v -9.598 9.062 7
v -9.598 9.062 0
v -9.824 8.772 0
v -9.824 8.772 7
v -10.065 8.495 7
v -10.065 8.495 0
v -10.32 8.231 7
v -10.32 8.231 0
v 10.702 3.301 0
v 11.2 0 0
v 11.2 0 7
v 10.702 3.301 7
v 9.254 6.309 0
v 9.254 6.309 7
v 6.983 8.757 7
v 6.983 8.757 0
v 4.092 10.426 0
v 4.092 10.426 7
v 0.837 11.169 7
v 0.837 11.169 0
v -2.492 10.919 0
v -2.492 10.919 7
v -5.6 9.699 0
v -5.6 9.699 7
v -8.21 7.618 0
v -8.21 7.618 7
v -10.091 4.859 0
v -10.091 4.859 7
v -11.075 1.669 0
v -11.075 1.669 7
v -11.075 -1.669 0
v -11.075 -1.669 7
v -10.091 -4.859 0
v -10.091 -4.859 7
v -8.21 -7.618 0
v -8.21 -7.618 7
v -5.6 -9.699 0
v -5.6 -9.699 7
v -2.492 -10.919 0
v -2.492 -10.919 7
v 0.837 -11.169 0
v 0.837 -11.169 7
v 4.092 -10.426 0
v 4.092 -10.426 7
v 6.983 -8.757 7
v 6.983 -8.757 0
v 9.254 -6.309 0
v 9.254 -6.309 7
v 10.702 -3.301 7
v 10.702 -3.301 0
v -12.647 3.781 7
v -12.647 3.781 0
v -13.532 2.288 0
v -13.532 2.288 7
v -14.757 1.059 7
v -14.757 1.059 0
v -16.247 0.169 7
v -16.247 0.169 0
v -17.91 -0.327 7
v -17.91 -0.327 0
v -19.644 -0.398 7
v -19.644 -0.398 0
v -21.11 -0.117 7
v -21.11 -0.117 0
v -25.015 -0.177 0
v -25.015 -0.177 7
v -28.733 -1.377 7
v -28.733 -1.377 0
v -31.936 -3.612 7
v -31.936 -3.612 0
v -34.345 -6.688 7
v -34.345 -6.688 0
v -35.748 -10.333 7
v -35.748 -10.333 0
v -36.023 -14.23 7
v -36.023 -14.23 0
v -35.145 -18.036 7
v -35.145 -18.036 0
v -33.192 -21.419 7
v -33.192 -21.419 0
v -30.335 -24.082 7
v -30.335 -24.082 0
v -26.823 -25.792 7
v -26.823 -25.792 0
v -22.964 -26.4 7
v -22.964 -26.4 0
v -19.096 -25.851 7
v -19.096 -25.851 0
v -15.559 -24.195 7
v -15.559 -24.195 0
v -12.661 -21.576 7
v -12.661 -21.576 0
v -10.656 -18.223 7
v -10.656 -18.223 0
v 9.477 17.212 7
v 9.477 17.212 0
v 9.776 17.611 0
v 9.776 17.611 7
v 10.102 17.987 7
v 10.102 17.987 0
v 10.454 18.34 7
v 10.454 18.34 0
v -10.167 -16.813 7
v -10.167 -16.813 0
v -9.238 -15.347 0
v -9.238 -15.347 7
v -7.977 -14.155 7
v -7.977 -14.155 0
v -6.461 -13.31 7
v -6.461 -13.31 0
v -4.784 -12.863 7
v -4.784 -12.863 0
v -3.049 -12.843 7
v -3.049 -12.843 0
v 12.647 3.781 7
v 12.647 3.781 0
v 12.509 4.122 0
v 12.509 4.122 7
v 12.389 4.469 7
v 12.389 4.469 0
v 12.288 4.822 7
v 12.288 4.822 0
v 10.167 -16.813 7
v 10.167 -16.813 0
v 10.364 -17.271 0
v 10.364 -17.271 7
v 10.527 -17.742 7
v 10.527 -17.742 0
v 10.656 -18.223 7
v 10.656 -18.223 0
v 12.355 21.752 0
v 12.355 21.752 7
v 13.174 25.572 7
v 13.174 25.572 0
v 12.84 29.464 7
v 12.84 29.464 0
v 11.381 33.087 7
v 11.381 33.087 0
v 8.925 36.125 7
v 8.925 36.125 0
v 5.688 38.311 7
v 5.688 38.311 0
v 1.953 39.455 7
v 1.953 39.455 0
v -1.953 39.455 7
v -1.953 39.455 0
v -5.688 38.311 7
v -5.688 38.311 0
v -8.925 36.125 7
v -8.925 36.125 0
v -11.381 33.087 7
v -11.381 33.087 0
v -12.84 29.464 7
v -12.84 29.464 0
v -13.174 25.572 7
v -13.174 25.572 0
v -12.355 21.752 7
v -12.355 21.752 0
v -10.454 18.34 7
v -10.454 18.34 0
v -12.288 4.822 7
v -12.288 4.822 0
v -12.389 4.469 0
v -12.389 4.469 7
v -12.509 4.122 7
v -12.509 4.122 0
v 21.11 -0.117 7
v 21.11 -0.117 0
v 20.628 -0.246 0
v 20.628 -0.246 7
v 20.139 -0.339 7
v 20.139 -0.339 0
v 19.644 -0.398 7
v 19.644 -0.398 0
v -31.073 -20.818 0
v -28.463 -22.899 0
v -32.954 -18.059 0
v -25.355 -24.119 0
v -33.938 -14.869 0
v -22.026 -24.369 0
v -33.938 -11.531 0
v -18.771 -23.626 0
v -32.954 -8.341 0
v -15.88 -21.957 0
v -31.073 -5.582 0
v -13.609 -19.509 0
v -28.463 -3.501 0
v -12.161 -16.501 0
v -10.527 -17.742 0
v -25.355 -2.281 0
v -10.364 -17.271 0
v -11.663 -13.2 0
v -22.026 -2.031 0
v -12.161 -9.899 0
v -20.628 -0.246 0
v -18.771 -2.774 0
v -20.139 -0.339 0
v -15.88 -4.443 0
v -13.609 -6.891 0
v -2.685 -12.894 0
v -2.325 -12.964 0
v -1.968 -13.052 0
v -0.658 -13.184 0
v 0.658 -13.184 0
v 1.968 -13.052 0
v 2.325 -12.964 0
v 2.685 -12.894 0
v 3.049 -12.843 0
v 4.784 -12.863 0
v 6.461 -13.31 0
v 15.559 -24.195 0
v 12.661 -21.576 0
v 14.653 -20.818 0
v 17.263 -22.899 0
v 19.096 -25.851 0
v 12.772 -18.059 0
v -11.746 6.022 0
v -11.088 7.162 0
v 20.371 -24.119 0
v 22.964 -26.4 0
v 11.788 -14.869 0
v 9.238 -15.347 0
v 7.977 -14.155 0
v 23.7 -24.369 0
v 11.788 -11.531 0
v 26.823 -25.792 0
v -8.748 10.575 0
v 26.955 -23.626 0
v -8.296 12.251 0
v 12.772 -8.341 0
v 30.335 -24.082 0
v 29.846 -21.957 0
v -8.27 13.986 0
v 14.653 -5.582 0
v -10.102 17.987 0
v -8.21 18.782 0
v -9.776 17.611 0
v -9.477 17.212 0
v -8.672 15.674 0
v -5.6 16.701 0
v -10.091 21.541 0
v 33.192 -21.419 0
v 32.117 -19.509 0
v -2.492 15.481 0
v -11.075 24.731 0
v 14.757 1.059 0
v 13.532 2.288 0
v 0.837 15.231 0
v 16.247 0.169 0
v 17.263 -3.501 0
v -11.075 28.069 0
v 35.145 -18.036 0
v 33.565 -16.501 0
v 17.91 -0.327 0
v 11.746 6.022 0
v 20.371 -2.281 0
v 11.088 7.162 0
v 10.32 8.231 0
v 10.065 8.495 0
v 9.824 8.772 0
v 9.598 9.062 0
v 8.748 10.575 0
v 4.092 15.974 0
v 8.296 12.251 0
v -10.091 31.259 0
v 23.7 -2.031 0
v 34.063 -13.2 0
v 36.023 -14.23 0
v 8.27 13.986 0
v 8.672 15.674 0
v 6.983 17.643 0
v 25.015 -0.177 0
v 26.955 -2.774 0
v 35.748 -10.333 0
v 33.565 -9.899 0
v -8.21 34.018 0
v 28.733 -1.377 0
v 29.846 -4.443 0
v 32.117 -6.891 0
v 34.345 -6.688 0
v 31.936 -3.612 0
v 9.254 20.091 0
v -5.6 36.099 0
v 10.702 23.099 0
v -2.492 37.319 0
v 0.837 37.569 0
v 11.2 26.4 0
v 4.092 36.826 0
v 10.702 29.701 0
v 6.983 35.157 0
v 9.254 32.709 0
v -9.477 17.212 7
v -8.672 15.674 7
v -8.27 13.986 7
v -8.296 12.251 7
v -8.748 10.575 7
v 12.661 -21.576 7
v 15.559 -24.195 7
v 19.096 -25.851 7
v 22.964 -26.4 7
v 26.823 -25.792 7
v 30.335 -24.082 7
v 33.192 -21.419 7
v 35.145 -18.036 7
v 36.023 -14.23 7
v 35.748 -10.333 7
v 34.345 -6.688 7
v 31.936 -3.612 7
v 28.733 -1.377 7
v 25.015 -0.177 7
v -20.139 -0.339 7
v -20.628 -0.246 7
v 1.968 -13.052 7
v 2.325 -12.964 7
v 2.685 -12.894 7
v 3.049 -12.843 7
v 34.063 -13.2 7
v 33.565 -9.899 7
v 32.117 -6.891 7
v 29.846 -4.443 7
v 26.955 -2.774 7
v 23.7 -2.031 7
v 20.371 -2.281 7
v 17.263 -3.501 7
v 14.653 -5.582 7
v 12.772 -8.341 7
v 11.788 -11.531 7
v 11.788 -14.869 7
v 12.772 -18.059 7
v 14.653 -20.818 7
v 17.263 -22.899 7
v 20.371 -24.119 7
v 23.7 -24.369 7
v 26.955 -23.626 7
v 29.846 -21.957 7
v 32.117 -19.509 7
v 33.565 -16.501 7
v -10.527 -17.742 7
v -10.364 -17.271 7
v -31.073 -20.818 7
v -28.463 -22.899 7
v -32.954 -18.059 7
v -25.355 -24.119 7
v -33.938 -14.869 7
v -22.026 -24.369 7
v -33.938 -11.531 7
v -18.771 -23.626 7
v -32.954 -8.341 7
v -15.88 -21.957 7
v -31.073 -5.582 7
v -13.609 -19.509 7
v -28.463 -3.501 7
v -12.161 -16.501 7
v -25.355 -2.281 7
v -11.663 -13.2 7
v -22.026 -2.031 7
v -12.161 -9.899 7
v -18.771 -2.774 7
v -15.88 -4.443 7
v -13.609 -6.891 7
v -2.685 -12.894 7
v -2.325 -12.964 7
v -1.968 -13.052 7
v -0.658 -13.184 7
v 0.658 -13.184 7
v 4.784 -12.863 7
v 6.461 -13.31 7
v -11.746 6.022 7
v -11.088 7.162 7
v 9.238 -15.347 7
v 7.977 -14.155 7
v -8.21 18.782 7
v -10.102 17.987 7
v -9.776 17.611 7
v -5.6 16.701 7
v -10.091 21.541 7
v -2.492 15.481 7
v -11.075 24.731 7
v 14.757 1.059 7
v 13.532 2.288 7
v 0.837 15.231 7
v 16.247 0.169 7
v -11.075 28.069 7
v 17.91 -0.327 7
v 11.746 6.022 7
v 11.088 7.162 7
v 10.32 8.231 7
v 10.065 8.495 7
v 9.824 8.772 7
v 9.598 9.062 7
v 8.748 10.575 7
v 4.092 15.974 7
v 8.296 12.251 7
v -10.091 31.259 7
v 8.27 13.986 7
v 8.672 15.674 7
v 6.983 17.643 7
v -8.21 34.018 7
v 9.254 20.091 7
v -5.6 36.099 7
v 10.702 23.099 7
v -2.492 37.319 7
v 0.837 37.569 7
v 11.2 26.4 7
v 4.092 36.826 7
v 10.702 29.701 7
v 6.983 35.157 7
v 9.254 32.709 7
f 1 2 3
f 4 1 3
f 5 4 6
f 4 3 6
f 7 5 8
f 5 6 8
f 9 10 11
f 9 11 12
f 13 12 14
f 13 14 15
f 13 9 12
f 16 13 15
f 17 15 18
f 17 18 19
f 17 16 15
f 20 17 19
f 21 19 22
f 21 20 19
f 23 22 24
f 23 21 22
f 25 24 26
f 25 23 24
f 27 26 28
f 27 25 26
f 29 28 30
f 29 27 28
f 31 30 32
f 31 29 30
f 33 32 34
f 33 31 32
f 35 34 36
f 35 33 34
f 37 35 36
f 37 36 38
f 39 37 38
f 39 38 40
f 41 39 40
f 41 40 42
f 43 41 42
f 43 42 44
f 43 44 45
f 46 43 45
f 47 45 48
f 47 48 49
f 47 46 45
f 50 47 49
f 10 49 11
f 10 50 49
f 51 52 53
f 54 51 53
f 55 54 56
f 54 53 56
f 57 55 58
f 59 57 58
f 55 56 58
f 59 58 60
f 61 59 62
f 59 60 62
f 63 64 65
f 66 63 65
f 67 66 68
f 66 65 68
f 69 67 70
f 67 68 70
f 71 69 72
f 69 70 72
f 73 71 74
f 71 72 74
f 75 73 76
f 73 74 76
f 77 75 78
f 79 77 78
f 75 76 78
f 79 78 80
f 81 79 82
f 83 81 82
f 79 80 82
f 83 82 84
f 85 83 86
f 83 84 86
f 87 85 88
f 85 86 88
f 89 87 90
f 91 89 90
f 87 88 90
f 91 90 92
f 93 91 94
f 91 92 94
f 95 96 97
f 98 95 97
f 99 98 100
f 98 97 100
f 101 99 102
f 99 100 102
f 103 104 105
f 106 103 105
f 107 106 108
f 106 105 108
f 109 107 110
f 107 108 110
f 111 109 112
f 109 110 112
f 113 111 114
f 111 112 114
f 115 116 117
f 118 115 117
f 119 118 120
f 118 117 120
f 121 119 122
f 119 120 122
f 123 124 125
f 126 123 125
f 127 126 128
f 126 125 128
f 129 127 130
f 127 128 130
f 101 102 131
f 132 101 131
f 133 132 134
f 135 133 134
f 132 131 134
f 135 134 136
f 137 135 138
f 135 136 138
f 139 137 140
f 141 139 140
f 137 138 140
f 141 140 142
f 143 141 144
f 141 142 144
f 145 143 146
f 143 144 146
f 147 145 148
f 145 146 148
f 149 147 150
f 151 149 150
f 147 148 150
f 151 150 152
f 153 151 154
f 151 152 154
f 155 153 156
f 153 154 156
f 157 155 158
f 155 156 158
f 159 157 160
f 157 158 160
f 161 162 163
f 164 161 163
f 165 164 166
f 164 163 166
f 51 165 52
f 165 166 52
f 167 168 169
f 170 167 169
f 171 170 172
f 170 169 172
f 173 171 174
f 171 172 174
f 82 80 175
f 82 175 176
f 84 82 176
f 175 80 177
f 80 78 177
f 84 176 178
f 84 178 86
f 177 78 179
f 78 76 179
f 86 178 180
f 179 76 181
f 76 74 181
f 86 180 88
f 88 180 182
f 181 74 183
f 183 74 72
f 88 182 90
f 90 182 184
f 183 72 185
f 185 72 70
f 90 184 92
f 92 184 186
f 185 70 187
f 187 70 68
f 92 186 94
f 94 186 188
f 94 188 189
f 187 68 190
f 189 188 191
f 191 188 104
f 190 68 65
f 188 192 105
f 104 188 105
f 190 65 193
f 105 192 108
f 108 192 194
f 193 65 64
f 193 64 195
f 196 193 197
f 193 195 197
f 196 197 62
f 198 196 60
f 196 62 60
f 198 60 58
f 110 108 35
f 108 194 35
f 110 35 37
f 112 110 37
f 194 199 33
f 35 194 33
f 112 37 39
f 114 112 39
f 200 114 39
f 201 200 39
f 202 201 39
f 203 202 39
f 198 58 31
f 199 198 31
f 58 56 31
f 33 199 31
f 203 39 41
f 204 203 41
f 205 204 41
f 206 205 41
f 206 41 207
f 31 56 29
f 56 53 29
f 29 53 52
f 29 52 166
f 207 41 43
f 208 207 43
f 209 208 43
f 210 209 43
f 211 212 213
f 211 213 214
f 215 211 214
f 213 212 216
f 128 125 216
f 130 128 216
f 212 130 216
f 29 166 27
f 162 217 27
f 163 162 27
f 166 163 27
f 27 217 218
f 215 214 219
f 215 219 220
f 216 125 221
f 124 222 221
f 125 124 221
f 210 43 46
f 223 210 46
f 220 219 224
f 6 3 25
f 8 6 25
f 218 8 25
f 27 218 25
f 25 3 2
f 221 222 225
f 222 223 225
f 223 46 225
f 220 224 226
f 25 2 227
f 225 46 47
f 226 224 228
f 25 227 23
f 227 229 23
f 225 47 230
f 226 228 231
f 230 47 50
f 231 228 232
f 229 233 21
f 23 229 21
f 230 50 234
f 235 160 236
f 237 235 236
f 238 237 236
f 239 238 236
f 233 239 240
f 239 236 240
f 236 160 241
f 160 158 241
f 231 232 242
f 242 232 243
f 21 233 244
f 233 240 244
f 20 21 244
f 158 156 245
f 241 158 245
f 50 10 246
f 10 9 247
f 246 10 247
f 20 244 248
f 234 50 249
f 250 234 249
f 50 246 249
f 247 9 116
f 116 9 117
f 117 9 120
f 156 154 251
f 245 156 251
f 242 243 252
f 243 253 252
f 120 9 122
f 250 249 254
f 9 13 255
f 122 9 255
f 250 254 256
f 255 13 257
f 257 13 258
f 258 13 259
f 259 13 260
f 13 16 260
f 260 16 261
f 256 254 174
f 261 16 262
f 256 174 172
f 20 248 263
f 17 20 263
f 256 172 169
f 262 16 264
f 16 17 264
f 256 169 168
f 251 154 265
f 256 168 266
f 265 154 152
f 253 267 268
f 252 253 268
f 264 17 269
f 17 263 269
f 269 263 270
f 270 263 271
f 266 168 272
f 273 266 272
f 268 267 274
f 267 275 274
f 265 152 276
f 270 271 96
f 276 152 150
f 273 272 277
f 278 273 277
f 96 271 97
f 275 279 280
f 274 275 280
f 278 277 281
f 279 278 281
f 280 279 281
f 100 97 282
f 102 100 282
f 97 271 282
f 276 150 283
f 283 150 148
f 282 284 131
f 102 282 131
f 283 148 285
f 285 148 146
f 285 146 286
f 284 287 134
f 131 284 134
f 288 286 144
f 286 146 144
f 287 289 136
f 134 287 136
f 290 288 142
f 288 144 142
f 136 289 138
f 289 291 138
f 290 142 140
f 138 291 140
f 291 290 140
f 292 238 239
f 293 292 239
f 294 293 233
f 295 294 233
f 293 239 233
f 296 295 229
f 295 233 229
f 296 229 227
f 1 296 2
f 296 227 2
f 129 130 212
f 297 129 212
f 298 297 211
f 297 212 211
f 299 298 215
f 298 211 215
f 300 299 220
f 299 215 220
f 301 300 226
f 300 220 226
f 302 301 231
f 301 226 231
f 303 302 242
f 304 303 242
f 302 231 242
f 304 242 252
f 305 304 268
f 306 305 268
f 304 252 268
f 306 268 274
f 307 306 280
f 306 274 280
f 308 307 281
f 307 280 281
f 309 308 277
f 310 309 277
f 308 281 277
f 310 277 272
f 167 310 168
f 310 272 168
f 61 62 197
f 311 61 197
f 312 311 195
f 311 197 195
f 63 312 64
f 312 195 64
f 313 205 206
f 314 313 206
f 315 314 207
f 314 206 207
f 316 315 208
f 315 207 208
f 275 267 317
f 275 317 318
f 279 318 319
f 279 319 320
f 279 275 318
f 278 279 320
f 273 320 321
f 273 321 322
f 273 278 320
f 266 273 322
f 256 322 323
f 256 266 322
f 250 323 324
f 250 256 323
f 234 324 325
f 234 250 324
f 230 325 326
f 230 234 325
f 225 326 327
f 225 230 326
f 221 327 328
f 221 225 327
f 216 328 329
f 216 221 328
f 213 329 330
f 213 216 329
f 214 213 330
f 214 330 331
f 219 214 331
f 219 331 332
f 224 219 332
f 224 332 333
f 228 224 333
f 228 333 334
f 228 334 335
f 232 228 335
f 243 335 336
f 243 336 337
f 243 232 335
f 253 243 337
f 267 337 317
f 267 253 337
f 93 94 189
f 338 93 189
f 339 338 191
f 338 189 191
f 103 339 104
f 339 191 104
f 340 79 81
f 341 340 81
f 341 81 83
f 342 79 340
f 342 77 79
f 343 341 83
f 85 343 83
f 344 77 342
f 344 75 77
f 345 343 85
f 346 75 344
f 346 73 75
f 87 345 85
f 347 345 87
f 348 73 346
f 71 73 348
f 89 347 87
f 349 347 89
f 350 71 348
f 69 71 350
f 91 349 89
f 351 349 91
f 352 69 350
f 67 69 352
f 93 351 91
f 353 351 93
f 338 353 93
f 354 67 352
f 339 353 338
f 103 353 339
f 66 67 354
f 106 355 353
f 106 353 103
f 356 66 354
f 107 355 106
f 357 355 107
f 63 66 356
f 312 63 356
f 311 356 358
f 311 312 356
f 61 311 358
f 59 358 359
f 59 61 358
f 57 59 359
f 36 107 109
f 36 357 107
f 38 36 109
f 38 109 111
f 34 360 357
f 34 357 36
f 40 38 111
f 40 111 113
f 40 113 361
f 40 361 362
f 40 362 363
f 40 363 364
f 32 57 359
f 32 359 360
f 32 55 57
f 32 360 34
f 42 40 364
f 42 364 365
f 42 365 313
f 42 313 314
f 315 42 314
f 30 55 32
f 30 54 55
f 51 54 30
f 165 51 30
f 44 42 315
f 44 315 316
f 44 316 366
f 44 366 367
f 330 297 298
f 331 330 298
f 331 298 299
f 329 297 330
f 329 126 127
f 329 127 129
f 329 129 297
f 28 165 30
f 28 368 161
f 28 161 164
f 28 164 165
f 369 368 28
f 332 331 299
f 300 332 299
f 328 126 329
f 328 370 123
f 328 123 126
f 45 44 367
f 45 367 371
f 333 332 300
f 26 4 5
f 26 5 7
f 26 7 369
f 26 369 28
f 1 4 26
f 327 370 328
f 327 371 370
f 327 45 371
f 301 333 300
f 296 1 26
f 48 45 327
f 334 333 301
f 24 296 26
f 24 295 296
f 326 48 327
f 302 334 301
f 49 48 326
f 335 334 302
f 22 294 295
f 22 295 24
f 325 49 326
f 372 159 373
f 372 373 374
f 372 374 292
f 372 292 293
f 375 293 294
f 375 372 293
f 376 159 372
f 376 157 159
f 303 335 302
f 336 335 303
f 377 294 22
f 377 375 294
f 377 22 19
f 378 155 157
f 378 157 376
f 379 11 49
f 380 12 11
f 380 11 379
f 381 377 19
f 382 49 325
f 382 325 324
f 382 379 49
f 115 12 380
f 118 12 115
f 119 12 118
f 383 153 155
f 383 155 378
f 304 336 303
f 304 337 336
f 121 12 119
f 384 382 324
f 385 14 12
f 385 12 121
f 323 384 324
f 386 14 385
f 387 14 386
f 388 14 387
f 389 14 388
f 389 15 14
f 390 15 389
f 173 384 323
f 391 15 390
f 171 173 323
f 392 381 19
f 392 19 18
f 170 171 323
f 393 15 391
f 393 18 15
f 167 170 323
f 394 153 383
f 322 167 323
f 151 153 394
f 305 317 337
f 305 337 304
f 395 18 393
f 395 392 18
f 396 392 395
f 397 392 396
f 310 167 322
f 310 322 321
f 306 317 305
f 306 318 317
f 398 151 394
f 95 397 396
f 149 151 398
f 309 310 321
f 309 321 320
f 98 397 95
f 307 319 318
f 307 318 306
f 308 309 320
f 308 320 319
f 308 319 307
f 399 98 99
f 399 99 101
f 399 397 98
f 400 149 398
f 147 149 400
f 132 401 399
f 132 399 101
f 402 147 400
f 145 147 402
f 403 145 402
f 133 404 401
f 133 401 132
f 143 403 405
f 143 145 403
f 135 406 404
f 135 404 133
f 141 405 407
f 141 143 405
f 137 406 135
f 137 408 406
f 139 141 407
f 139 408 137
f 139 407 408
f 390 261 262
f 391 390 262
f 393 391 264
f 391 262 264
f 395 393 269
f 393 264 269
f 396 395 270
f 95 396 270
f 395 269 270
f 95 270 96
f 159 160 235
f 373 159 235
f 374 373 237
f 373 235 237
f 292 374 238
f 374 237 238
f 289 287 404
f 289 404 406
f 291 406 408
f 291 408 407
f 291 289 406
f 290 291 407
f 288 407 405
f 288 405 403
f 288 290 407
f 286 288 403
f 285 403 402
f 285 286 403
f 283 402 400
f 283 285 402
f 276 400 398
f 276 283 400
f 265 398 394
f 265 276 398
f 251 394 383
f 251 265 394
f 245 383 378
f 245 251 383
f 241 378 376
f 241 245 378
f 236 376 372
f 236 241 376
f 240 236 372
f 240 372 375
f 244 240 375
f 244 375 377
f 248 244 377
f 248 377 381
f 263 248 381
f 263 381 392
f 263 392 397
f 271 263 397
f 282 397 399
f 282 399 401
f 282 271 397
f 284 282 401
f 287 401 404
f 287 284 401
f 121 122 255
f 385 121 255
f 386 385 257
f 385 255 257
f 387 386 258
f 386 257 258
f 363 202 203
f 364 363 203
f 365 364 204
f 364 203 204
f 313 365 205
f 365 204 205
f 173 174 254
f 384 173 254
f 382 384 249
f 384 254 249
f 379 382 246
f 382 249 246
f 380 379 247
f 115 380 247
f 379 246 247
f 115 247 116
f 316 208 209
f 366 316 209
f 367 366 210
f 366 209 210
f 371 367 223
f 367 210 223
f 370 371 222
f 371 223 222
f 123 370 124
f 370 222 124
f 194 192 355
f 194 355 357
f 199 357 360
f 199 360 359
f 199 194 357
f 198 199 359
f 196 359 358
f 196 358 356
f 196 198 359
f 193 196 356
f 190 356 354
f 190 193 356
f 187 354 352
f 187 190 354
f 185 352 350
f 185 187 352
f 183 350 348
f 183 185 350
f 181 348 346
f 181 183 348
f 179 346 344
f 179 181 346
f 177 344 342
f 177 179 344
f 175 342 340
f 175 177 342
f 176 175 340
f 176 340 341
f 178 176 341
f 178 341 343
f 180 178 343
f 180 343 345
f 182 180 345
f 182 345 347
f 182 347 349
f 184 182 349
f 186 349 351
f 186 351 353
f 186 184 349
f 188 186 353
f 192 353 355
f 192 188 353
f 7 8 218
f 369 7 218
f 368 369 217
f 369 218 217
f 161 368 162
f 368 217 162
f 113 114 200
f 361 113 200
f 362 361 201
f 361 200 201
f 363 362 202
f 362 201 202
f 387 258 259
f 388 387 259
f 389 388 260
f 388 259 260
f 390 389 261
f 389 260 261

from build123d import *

# Parameters (mm, degrees)
F0_R     = 11.2
F1_DEPTH = 7


with BuildPart() as f1:
    # F0 (on Top) → F1 (new body)
    with BuildSketch(Plane.XY):
        with BuildLine():
            ThreePointArc((9.598043, 9.061875), (8.22906, 13.11739), (9.47712, 17.211736))
            ThreePointArc((9.47712, 17.211736), (9.935183, 17.801964), (10.453543, 18.34001))
            ThreePointArc((10.453543, 18.34001), (0, 39.6), (-10.453543, 18.34001))
            ThreePointArc((-10.453543, 18.34001), (-9.935183, 17.801964), (-9.47712, 17.211736))
            ThreePointArc((-9.47712, 17.211736), (-8.22906, 13.11739), (-9.598043, 9.061875))
            ThreePointArc((-9.598043, 9.061875), (-9.942486, 8.632092), (-10.319653, 8.230721))
            ThreePointArc((-10.319653, 8.230721), (-11.431535, 6.6), (-12.28784, 4.821721))
            ThreePointArc((-12.28784, 4.821721), (-12.446854, 4.294399), (-12.646835, 3.781212))
            ThreePointArc((-12.646835, 3.781212), (-15.474523, 0.56788), (-19.64436, -0.398441))
            ThreePointArc((-19.64436, -0.398441), (-20.384544, -0.296861), (-21.109686, -0.116971))
            ThreePointArc((-21.109686, -0.116971), (-34.294606, -19.8), (-10.656143, -18.223039))
            ThreePointArc((-10.656143, -18.223039), (-10.449362, -17.505103), (-10.16724, -16.813294))
            ThreePointArc((-10.16724, -16.813294), (-7.245463, -13.68527), (-3.048792, -12.843086))
            ThreePointArc((-3.048792, -12.843086), (-2.504368, -12.926492), (-1.968187, -13.052442))
            ThreePointArc((-1.968187, -13.052442), (0, -13.2), (1.968187, -13.052442))
            ThreePointArc((1.968187, -13.052442), (2.504368, -12.926492), (3.048792, -12.843086))
            ThreePointArc((3.048792, -12.843086), (7.245463, -13.68527), (10.16724, -16.813294))
            ThreePointArc((10.16724, -16.813294), (10.449362, -17.505103), (10.656143, -18.223039))
            ThreePointArc((10.656143, -18.223039), (34.294606, -19.8), (21.109686, -0.116971))
            ThreePointArc((21.109686, -0.116971), (20.384544, -0.296861), (19.64436, -0.398441))
            ThreePointArc((19.64436, -0.398441), (15.474523, 0.56788), (12.646835, 3.781212))
            ThreePointArc((12.646835, 3.781212), (12.446854, 4.294399), (12.28784, 4.821721))
            ThreePointArc((12.28784, 4.821721), (11.431535, 6.6), (10.319653, 8.230721))
            ThreePointArc((10.319653, 8.230721), (9.942486, 8.632092), (9.598043, 9.061875))
        make_face()
        with Locations((-22.863071, -13.2)):
            Circle(F0_R, mode=Mode.SUBTRACT)
        with Locations((22.863071, -13.2)):
            Circle(F0_R, mode=Mode.SUBTRACT)
        Circle(F0_R, mode=Mode.SUBTRACT)
        with Locations((0, 26.4)):
            Circle(F0_R, mode=Mode.SUBTRACT)
    extrude(amount=F1_DEPTH)


solid = f1.part
